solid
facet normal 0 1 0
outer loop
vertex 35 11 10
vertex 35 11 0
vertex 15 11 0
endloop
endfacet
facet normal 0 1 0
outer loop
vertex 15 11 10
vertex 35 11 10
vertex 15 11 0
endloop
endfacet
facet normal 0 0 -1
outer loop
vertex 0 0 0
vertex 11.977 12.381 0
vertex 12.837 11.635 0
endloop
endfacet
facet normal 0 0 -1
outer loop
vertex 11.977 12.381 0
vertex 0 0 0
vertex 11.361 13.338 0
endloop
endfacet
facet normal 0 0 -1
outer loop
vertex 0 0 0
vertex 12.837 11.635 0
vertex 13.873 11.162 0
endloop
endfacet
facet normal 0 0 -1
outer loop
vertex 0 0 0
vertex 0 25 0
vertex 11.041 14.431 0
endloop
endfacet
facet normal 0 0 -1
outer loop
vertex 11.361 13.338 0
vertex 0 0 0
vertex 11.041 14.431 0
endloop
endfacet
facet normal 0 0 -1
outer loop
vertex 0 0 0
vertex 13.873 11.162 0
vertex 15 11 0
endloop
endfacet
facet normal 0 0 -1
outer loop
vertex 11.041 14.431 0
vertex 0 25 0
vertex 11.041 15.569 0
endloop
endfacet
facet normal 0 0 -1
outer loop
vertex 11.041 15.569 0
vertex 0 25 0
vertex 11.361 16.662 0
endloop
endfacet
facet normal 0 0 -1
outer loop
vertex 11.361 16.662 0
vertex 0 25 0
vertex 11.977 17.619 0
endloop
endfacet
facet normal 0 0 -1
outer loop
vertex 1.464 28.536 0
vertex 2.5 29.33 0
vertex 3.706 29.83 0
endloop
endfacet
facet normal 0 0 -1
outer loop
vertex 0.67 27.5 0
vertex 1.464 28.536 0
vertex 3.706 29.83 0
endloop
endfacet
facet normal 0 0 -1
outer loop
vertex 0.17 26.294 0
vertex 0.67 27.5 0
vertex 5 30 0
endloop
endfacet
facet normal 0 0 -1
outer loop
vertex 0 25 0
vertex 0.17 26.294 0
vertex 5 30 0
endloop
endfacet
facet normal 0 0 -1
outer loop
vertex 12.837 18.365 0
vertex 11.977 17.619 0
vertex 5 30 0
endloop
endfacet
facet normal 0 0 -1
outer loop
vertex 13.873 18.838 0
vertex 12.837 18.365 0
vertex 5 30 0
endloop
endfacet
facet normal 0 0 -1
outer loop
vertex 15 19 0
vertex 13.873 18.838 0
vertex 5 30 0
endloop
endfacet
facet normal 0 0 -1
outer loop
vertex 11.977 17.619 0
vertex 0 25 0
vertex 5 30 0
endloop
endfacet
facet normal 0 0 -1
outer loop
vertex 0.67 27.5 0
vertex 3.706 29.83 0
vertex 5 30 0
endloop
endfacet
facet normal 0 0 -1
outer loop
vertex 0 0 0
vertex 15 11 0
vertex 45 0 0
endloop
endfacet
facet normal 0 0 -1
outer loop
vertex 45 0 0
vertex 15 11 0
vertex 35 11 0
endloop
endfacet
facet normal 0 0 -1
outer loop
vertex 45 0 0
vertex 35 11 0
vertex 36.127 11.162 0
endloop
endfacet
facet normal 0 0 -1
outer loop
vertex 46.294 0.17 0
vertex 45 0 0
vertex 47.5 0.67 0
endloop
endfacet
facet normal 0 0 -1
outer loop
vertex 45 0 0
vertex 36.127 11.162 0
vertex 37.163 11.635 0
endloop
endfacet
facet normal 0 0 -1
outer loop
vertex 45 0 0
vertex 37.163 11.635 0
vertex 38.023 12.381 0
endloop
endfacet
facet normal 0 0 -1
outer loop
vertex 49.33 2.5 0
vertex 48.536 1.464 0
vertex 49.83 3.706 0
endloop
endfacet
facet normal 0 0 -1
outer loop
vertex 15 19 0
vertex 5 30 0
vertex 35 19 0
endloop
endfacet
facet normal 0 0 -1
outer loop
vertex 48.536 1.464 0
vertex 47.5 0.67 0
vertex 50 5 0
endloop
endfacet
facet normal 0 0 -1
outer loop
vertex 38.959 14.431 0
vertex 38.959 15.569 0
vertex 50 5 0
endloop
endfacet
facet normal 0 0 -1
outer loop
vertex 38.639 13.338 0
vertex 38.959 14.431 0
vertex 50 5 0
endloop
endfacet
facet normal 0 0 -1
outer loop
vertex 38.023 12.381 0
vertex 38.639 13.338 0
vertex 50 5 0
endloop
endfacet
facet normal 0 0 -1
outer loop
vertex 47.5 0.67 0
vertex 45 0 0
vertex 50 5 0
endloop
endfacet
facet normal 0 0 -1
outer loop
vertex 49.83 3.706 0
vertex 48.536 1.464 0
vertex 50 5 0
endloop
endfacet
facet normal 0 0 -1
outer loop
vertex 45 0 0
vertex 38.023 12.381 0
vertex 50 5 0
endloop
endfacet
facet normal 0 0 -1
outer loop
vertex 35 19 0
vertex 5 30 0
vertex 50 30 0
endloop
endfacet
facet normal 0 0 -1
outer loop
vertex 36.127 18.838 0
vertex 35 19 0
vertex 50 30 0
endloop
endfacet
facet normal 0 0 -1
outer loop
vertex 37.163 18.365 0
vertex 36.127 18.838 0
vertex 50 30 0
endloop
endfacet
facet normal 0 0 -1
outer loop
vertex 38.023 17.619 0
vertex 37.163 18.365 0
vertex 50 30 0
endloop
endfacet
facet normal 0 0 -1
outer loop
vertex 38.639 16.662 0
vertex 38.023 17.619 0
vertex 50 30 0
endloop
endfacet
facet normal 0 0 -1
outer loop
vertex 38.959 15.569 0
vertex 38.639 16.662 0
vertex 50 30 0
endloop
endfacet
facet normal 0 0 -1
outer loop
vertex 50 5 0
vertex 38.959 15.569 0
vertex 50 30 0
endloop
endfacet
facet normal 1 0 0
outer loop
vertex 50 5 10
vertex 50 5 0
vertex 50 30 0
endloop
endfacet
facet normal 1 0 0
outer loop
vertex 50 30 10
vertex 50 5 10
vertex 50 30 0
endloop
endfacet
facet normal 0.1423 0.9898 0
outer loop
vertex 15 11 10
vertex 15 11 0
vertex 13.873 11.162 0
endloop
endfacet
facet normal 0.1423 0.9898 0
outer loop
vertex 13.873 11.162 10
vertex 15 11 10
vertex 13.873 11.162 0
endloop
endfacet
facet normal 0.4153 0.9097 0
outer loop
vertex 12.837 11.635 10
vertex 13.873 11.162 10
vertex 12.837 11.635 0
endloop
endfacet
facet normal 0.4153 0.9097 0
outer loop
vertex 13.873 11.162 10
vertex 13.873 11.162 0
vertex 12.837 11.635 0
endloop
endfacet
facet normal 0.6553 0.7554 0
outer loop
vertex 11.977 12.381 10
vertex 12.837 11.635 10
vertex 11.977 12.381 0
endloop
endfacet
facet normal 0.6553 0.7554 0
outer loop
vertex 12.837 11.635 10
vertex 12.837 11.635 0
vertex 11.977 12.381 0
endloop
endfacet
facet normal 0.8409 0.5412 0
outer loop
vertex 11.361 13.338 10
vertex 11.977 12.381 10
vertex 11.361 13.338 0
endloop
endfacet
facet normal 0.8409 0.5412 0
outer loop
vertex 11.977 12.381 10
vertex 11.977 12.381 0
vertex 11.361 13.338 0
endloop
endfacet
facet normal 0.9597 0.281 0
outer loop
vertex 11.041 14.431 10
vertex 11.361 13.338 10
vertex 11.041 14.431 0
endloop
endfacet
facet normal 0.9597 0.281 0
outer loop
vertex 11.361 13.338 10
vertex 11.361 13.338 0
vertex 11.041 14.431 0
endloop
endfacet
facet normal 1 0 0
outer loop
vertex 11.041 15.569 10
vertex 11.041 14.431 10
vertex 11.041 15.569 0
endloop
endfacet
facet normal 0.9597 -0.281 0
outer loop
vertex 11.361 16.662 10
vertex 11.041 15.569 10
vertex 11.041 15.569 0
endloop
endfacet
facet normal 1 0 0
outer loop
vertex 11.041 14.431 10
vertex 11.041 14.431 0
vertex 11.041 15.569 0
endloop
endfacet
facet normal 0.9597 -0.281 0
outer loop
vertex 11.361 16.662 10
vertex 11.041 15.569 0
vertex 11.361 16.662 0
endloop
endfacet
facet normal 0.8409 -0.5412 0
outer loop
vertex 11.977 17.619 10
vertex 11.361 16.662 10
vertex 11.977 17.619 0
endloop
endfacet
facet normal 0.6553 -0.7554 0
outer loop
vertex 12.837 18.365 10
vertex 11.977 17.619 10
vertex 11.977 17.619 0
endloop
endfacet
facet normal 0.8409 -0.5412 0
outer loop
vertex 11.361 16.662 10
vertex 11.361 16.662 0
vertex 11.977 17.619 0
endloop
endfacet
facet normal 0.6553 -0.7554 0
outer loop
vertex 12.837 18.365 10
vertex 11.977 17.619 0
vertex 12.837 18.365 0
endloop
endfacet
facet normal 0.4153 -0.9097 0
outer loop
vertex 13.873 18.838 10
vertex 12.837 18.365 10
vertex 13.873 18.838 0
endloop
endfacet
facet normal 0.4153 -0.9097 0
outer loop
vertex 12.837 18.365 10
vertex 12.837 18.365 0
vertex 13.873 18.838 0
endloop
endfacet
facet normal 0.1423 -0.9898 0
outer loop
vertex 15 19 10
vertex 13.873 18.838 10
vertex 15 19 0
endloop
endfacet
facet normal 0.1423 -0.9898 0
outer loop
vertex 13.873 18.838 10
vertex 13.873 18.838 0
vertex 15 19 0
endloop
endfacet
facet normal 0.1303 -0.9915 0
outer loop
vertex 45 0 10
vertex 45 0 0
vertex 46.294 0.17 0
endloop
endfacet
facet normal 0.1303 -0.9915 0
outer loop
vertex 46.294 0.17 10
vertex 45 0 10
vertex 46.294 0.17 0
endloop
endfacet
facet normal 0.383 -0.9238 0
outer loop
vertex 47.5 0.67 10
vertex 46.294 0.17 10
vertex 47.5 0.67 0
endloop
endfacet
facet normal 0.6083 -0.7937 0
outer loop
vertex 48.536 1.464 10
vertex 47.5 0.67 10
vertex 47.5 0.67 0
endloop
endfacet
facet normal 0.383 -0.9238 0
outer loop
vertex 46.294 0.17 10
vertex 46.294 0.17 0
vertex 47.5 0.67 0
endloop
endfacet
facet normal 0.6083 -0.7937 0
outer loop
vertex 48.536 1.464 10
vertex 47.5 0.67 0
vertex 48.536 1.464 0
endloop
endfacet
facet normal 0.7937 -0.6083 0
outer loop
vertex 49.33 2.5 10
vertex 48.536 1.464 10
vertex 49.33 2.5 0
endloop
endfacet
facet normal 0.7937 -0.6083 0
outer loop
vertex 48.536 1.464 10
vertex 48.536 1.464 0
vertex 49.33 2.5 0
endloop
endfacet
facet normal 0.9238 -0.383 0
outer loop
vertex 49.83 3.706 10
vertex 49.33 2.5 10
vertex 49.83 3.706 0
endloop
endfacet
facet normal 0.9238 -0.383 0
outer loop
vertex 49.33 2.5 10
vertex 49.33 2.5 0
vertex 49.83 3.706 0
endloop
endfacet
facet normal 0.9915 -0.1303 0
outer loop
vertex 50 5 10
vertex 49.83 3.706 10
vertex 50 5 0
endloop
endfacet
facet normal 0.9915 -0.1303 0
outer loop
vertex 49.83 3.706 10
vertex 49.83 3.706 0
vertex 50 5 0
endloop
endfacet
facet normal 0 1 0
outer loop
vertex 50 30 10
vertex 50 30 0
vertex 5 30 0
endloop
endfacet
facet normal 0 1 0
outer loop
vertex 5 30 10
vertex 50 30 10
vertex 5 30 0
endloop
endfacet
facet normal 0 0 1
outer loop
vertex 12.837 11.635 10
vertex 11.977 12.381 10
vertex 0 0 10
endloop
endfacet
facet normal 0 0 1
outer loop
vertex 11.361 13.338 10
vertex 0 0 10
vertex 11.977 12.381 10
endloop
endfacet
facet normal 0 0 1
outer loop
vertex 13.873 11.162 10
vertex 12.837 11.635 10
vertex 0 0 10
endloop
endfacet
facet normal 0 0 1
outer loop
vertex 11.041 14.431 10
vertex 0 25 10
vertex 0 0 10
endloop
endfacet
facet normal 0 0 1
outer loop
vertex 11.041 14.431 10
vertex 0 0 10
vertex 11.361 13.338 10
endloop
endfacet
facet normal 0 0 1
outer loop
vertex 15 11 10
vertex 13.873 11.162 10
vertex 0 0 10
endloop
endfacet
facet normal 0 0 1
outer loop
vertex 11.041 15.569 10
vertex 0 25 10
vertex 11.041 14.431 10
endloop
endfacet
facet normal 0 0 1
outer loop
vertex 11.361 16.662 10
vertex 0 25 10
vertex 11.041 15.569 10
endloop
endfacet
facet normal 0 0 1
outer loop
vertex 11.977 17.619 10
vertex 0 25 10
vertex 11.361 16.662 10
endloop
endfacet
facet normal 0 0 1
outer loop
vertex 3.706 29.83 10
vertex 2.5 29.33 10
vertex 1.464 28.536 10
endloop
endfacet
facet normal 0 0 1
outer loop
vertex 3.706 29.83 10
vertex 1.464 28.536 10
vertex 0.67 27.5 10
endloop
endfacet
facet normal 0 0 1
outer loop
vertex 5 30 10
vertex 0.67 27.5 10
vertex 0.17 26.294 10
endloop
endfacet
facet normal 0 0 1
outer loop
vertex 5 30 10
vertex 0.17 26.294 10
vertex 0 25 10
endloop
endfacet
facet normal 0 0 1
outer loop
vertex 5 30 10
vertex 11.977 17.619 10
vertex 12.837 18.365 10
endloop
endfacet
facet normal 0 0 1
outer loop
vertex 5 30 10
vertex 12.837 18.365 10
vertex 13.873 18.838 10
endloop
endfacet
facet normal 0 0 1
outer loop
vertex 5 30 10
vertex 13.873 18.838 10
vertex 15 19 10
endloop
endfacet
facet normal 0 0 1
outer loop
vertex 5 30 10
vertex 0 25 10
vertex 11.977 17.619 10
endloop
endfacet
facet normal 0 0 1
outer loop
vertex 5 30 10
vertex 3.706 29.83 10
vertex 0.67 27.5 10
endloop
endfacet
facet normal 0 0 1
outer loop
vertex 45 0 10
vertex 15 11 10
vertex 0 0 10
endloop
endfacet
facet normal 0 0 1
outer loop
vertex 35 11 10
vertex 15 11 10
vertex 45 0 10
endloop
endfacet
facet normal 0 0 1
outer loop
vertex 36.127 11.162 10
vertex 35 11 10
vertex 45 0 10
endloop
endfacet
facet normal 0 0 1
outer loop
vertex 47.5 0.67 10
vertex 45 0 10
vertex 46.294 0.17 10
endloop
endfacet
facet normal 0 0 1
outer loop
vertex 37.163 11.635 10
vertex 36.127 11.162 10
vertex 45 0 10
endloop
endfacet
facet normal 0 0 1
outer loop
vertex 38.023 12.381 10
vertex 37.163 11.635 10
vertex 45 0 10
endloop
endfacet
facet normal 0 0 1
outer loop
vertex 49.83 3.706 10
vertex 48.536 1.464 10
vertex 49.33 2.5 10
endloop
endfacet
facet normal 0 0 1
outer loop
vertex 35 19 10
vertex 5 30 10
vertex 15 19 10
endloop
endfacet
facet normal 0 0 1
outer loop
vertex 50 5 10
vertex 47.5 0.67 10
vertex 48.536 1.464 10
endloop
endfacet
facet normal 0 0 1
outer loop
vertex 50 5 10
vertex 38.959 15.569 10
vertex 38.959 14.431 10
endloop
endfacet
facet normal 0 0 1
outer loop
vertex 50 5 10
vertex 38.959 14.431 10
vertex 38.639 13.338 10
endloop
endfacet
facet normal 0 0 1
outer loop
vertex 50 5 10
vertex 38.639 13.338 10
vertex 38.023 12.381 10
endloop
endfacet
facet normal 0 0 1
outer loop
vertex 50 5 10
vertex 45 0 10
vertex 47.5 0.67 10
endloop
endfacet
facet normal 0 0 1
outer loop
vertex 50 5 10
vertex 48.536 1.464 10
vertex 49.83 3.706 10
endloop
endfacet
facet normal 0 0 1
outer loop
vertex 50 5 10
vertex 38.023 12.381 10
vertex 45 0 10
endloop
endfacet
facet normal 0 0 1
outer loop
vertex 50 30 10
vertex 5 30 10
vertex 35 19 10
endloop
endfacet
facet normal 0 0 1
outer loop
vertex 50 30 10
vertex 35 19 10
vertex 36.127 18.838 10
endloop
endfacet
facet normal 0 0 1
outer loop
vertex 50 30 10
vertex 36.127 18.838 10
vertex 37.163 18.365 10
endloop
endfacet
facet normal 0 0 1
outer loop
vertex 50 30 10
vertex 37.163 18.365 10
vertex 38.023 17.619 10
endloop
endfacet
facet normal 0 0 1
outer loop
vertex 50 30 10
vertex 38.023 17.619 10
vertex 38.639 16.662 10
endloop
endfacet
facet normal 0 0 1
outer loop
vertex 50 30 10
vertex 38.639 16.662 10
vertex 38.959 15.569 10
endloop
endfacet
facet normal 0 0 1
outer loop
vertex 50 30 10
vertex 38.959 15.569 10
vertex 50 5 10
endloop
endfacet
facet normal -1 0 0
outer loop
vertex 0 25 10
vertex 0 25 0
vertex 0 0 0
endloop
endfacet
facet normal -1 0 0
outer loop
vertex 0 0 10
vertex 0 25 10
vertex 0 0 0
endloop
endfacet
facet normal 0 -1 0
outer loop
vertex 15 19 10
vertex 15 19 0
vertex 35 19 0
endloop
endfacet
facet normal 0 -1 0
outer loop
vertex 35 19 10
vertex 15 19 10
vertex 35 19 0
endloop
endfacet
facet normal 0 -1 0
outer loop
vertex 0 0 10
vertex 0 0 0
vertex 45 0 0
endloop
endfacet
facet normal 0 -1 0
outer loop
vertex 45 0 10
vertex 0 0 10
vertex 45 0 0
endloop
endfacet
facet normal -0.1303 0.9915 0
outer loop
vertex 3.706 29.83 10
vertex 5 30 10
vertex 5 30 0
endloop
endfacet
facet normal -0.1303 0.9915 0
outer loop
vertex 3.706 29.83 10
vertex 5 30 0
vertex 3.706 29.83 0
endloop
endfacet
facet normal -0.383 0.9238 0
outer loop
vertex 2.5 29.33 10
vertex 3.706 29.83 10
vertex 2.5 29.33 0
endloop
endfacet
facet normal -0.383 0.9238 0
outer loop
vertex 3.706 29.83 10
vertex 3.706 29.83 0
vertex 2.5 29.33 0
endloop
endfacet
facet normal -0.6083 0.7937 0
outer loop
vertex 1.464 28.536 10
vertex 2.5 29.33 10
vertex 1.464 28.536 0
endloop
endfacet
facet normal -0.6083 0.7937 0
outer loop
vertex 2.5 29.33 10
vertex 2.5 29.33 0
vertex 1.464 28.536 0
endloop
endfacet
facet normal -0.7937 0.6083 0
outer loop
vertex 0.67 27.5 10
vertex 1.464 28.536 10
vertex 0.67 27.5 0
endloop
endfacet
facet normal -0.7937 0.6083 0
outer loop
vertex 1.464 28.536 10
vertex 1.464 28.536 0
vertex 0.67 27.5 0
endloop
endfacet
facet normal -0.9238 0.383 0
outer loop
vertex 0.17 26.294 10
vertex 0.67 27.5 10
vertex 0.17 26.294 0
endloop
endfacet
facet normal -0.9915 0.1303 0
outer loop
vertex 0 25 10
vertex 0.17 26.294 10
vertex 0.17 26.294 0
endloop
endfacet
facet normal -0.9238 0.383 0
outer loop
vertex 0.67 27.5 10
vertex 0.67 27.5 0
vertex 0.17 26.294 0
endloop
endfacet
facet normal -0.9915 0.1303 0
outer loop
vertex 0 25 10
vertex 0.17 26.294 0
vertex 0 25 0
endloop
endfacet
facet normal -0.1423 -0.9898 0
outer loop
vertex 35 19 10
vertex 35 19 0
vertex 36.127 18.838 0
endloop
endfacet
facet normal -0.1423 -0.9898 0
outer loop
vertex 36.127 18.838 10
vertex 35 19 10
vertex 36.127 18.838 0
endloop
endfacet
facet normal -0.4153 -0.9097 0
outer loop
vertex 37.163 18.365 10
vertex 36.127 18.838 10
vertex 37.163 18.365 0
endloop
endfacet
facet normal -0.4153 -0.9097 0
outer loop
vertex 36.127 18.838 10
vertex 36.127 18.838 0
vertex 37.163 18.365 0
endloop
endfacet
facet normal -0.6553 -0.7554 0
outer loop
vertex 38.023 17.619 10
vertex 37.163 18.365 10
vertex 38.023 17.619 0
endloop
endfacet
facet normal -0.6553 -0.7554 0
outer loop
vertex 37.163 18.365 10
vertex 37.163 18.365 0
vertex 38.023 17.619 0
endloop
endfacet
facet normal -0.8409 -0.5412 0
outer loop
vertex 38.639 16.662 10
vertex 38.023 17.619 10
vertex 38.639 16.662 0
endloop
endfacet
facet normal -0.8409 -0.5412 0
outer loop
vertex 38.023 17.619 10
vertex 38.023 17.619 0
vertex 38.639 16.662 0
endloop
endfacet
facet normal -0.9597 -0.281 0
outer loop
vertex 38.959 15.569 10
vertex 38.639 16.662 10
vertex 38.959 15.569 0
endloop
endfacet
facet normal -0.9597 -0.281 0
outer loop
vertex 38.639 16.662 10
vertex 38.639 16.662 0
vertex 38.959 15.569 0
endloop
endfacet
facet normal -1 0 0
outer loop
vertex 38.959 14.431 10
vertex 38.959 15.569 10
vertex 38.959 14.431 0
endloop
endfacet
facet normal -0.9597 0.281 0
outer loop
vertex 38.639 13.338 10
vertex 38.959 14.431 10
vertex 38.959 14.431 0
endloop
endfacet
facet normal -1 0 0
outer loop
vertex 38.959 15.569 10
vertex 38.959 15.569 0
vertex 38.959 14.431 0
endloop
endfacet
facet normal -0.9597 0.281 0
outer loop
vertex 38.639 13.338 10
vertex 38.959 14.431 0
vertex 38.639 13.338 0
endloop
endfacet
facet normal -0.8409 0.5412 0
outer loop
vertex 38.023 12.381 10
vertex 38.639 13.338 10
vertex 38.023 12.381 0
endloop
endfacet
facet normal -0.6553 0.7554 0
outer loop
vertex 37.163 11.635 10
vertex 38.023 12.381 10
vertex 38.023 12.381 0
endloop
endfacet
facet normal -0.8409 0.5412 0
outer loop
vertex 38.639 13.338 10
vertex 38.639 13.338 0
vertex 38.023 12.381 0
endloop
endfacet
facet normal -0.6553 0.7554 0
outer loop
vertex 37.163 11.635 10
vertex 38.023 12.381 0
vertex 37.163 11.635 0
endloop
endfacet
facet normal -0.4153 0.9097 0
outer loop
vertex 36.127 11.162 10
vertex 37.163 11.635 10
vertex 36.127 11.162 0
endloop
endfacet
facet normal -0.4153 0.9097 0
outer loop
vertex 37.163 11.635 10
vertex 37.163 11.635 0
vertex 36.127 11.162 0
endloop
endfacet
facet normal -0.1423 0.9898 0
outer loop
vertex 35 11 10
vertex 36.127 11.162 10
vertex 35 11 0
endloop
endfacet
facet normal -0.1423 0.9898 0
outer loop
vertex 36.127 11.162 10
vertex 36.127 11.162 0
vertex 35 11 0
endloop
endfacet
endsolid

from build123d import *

# Parameters (mm, degrees)
BOSS_EXTRUDE1_DEPTH = 10


with BuildPart() as part:
    # Sketch1 → Boss-Extrude1 (new body)
    with BuildSketch(Plane.XY):
        with BuildLine():
            Line((0, 0), (45, 0))
            ThreePointArc((45, 0), (48.535533906, 1.464466094), (50, 5))
            Line((50, 5), (50, 30))
            Line((50, 30), (5, 30))
            ThreePointArc((5, 30), (1.464466094, 28.535533906), (0, 25))
            Line((0, 25), (0, 0))
        make_face()
        with BuildLine():
            Line((15, 19), (35, 19))
            ThreePointArc((35, 19), (39, 15), (35, 11))
            Line((35, 11), (15, 11))
            ThreePointArc((15, 11), (11, 15), (15, 19))
        make_face(mode=Mode.SUBTRACT)
    extrude(amount=BOSS_EXTRUDE1_DEPTH)


solid = part.part
